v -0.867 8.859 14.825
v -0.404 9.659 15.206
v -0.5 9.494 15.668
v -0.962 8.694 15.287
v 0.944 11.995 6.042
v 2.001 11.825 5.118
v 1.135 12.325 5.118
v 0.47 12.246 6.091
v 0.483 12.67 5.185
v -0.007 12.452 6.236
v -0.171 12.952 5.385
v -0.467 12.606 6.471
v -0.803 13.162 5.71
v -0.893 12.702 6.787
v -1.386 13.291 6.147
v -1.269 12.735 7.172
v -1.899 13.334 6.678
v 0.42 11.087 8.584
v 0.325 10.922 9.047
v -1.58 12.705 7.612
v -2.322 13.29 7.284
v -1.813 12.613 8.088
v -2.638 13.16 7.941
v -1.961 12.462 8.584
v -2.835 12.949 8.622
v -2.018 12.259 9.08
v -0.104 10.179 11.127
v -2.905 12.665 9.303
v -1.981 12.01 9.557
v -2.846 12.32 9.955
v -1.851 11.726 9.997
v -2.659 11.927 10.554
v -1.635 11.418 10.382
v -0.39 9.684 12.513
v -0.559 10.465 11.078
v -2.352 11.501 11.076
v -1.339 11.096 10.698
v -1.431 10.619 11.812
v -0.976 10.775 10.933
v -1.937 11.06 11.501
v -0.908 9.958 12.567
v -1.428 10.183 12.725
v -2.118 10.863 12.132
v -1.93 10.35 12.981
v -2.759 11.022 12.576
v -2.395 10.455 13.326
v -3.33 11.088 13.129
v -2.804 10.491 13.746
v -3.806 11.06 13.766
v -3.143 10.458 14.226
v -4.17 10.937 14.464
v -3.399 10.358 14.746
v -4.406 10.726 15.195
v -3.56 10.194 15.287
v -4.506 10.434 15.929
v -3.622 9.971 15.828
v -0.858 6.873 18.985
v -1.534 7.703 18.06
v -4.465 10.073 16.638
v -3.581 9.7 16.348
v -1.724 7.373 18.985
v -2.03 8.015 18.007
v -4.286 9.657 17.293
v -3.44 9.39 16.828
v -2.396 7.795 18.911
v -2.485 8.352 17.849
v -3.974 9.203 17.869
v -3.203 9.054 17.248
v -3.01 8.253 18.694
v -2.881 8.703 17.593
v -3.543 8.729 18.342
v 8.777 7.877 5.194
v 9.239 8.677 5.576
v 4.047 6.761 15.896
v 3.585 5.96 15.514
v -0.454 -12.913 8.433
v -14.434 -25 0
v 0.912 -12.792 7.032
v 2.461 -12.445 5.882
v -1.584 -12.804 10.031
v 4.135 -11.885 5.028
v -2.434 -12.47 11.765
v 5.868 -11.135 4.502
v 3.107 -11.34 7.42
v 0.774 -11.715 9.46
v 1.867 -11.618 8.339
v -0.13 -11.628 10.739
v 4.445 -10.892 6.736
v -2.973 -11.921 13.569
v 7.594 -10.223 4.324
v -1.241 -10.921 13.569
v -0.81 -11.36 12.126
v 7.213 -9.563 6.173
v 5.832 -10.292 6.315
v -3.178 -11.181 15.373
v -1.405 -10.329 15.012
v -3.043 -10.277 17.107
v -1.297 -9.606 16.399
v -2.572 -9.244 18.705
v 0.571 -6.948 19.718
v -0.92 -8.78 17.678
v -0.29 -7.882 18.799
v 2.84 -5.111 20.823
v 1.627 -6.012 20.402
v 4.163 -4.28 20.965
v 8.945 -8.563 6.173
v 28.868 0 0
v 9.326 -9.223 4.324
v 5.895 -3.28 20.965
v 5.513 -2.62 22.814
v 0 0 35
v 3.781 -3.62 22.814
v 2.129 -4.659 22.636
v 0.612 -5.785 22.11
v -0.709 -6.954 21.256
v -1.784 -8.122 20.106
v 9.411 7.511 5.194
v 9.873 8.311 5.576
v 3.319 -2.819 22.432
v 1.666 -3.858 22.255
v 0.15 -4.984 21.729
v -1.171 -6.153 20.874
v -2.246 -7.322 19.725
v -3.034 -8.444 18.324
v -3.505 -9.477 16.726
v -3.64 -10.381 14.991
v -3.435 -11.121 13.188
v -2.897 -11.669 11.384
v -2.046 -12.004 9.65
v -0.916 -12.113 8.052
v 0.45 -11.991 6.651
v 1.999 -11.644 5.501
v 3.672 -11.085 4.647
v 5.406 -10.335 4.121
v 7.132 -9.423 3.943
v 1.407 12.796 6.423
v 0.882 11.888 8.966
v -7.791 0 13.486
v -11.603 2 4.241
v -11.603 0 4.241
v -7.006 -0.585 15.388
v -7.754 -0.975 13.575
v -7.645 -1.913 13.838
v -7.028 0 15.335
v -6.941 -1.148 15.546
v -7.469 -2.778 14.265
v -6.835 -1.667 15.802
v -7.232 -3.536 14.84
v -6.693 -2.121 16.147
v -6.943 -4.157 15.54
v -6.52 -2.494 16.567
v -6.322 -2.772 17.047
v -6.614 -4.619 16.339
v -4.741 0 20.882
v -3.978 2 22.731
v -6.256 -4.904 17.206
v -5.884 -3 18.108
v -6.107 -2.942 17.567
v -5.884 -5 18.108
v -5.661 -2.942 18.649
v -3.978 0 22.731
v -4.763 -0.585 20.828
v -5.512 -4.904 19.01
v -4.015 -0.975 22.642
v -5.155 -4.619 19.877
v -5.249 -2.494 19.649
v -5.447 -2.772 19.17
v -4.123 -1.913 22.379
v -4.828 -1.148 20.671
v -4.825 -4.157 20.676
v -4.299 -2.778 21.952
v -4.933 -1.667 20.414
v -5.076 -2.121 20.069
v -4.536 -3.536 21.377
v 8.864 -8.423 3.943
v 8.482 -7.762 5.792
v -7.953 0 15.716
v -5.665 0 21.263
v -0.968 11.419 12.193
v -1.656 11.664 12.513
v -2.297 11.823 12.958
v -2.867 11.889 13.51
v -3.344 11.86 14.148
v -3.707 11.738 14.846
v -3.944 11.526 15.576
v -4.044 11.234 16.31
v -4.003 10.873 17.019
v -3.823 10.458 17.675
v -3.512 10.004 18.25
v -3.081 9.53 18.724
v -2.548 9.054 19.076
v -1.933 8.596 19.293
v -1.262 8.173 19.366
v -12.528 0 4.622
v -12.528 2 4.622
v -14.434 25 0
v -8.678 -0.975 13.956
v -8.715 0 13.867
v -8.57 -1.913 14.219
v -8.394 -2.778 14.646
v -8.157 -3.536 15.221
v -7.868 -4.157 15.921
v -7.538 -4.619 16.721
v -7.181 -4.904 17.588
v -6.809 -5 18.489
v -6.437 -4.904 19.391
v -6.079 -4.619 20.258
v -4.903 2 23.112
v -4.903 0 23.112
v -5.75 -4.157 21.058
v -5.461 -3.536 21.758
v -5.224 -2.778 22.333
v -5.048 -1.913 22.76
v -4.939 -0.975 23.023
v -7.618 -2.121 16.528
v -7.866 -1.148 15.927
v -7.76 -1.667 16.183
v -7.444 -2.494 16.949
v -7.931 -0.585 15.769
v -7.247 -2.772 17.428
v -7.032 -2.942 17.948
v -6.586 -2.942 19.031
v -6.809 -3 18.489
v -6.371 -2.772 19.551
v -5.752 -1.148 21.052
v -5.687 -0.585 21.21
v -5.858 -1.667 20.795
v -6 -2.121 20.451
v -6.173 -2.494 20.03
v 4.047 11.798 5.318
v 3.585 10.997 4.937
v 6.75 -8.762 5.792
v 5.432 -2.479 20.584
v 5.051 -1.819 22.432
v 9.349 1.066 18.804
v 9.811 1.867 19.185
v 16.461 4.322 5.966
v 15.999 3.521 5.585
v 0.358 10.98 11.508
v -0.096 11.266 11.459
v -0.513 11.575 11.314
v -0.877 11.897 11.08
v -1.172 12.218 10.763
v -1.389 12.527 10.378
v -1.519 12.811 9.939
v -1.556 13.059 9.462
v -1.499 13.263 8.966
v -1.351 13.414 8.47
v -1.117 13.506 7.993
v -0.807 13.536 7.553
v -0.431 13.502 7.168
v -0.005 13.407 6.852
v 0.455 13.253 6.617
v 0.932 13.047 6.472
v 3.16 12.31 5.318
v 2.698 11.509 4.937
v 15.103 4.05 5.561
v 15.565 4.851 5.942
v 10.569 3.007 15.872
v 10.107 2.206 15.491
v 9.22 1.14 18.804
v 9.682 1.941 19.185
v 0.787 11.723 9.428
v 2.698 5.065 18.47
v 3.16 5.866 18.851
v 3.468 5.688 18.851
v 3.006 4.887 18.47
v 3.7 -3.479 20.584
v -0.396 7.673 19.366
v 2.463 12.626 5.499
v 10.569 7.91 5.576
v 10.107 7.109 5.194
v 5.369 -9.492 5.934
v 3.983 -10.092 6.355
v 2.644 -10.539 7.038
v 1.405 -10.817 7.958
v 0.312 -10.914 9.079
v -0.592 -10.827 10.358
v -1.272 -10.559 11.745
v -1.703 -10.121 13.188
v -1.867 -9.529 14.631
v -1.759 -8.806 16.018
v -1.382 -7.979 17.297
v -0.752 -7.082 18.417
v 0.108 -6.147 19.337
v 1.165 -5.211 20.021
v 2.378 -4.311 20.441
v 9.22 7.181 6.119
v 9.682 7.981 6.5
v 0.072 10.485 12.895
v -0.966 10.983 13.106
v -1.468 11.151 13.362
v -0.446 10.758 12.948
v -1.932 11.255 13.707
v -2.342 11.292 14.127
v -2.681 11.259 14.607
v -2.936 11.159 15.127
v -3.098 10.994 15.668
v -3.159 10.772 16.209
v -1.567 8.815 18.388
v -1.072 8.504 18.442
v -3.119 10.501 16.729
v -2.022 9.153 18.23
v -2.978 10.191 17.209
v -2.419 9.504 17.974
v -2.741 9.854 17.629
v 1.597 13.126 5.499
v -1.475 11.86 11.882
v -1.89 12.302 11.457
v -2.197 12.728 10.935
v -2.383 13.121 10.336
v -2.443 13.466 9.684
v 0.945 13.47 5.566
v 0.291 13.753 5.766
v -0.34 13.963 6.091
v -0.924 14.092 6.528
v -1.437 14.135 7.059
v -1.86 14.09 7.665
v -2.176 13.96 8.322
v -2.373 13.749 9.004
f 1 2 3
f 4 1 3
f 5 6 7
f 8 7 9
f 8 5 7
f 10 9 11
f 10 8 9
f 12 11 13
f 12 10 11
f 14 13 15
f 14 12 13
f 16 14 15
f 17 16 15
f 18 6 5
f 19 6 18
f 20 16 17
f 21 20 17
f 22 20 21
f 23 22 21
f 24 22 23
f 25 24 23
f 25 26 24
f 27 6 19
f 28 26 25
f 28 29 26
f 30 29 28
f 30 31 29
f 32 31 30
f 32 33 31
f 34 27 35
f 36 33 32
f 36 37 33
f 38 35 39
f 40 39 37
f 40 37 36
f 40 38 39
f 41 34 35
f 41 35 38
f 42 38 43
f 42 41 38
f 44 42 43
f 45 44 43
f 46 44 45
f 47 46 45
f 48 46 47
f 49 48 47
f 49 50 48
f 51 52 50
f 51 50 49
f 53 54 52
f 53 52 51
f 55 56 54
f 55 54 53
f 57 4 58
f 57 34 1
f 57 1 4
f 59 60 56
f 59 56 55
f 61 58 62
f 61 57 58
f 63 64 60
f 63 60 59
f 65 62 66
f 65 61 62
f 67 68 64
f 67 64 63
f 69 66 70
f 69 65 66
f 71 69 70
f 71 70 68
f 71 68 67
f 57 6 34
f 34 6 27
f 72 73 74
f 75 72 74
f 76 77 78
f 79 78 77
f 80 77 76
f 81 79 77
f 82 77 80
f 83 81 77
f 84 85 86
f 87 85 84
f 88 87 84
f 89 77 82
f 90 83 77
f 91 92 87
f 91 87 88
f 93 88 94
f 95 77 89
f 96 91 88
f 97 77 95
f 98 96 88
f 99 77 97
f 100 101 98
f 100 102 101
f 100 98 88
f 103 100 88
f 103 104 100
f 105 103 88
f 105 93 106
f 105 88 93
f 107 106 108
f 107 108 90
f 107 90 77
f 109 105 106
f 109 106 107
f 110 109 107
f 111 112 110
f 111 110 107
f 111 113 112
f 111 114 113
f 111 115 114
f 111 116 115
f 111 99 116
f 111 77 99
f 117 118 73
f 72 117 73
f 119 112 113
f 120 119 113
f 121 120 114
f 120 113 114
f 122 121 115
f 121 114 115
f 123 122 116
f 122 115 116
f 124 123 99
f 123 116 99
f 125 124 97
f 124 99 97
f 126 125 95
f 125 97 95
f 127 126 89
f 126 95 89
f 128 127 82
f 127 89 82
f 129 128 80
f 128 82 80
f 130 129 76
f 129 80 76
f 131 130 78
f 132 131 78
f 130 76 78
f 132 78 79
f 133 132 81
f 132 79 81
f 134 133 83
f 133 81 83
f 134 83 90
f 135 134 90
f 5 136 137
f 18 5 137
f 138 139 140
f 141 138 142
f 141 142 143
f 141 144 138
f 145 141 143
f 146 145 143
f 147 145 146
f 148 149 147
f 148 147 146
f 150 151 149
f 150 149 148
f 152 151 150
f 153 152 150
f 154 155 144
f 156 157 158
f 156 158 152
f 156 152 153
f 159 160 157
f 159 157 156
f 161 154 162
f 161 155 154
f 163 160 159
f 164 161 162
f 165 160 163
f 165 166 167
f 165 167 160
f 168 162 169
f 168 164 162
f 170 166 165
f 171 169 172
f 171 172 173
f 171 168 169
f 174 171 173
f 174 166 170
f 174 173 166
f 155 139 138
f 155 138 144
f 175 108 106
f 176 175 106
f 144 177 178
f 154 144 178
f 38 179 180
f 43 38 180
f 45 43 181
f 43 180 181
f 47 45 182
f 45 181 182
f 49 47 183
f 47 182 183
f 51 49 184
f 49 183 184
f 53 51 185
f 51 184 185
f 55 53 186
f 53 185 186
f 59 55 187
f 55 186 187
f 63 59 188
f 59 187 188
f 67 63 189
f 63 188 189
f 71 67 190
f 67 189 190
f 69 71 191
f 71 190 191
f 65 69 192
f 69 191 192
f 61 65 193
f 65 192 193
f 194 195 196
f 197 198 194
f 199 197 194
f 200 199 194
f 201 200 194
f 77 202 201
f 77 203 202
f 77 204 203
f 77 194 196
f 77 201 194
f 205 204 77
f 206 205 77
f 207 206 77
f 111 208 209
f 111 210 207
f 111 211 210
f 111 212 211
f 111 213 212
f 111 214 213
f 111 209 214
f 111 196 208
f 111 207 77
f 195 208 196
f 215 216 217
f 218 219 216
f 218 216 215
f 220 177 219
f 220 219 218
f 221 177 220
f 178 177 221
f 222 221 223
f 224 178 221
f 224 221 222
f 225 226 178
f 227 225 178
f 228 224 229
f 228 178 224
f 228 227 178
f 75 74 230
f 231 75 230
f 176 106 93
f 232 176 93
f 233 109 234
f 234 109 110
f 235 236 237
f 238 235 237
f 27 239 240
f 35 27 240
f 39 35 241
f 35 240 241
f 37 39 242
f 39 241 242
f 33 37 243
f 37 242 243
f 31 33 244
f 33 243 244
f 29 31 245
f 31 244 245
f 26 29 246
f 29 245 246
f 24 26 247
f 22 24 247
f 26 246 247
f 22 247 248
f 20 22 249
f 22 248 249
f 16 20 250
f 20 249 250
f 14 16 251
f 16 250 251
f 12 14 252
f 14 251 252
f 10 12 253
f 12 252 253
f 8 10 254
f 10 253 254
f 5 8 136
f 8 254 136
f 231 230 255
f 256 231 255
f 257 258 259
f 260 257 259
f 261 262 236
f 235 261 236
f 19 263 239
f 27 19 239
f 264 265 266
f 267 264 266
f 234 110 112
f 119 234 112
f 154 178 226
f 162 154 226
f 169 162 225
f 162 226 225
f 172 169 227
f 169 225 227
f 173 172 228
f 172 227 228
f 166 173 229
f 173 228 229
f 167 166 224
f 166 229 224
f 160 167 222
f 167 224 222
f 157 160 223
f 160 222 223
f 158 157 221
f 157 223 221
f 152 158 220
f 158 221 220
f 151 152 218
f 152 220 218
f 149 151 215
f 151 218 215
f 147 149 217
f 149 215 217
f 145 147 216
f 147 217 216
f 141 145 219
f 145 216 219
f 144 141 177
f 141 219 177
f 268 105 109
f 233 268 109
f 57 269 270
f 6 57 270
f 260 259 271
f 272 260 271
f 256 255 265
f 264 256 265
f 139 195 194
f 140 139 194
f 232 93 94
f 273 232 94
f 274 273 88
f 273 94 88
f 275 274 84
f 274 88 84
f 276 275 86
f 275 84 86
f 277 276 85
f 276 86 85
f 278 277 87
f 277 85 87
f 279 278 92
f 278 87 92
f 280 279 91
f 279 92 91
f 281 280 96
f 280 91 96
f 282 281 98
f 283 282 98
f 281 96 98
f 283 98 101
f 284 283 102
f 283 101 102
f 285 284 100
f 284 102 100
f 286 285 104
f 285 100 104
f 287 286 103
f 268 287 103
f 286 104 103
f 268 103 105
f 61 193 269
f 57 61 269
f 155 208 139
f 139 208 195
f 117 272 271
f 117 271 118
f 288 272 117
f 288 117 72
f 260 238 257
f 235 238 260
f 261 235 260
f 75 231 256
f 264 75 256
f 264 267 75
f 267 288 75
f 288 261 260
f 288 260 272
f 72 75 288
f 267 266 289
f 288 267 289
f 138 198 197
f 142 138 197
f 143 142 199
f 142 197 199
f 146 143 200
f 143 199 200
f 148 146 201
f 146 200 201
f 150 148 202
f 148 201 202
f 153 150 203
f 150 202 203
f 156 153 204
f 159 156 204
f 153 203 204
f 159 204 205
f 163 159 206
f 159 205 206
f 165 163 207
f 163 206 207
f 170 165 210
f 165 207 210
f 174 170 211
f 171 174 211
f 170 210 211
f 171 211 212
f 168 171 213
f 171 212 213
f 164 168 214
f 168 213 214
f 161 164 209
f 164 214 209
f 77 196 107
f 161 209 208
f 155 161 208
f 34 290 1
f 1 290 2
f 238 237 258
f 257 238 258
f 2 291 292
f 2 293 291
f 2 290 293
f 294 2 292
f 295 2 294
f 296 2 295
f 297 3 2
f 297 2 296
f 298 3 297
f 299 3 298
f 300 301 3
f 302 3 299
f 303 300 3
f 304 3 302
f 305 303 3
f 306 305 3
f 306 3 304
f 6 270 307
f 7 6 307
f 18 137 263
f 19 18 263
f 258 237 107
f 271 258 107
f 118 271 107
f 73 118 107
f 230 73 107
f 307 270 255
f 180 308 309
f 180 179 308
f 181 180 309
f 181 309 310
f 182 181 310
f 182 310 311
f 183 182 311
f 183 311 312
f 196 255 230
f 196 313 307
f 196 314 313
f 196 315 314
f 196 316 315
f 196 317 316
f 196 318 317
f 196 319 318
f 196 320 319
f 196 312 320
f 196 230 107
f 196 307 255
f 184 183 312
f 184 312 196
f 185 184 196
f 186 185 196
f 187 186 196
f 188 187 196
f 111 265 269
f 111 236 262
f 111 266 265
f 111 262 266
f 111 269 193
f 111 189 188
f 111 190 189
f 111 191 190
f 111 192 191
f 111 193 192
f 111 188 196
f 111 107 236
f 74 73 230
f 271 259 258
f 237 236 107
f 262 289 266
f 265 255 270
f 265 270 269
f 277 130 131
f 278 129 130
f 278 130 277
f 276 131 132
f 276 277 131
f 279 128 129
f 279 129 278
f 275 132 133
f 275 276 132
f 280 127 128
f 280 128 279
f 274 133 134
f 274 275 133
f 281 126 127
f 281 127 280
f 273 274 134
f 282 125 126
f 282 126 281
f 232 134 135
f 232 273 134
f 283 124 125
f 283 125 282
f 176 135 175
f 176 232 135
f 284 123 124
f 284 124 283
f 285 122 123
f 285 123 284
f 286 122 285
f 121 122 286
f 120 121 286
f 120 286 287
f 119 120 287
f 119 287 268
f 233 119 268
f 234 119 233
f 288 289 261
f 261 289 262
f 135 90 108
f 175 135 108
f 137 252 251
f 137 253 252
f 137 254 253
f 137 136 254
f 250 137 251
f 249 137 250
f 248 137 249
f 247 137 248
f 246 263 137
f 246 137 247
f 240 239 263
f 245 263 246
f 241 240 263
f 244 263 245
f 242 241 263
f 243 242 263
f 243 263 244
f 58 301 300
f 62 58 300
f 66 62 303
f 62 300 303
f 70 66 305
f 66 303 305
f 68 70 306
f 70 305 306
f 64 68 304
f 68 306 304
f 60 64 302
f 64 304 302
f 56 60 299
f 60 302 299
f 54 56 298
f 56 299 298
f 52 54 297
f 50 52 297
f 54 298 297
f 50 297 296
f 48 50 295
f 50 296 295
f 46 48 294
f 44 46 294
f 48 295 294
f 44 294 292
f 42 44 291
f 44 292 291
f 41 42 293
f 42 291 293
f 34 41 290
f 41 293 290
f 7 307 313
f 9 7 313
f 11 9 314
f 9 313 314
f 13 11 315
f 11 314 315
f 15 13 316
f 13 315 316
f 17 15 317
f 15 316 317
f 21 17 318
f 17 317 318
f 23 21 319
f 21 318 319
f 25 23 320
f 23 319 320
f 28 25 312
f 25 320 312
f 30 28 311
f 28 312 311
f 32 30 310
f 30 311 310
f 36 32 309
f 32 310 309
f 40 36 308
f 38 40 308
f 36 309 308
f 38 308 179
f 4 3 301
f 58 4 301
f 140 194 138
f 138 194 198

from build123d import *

# Parameters (mm, degrees)
F5_DEPTH = 1
F7_DEPTH = 1
F9_DEPTH = 1


with BuildPart() as f3:
    # F0 (on Top) → F3 section 0
    with BuildSketch(Plane.XY, mode=Mode.PRIVATE) as f3_s0:
        Polygon((-14.4337567297, 25), (-14.4337567297, -25), (28.8675134595, 0), align=None)
    loft([f3_s0.sketch, Vertex(0, 0, 35)])

    # F4 (on face) → F5 (cut)
    with BuildSketch(Plane(origin=(-12.3358269725, 0, 5.0872093023), x_dir=(0, -1, 0), z_dir=(-0.9244734516, 0, 0.3812464258))):
        Polygon((-2, -0.5028181645), (0, -0.5028181645), (0, 9.4971818355), (0, 11.4971818355), (0, 17.4971818355), (0, 19.4971818355), (-2, 19.4971818355), align=None)
        with BuildLine():
            Line((0, 11.4971818355), (0, 9.4971818355))
            ThreePointArc((0, 9.4971818355), (5, 14.4971818355), (0, 19.4971818355))
            Line((0, 19.4971818355), (0, 17.4971818355))
            ThreePointArc((0, 17.4971818355), (3, 14.4971818355), (0, 11.4971818355))
        make_face()
    extrude(amount=-F5_DEPTH, mode=Mode.SUBTRACT)

    # F6 (on face) → F7 (cut)
    with BuildSketch(Plane(origin=(6.1679134863, -10.6831395349, 5.0872093023), x_dir=(0.8867565671, 0.4173352901, -0.1987310905), z_dir=(0.4622367258, -0.8006174942, 0.3812464258))):
        with BuildLine():
            Line((-0.7380038788, 19.4712978038), (-2.691246597, 19.0413642234))
            ThreePointArc((-2.691246597, 19.0413642234), (-10.3077922864, 7.1254827301), (1.6080892069, -0.4910629592))
            Line((1.6080892069, -0.4910629592), (3.5613319251, -0.0611293789))
            Line((3.5613319251, -0.0611293789), (3.1313983448, 1.8921133394))
            Line((3.1313983448, 1.8921133394), (1.1781556265, 1.462179759))
            ThreePointArc((1.1781556265, 1.462179759), (-8.3545495681, 7.5554163105), (-2.2613130166, 17.0881215051))
            Line((-2.2613130166, 17.0881215051), (-0.3080702984, 17.5180550855))
            Line((-0.3080702984, 17.5180550855), (-0.7380038788, 19.4712978038))
        make_face()
    extrude(amount=-F7_DEPTH, mode=Mode.SUBTRACT)

    # F8 (on face) → F9 (cut)
    with BuildSketch(Plane(origin=(6.1679134863, 10.6831395349, 5.0872093023), x_dir=(-0.8867565671, 0.4173352901, 0.1987310905), z_dir=(0.4622367258, 0.8006174942, 0.3812464258))):
        Polygon((2.3919107931, -0.2709502327), (3.3919107931, -0.4910629592), (3.3919107931, 14.4979807209), (3.0442146526, 14.5745130664), (-3.9632350967, 2.4372540691), (-3.9632350967, 16.4866717508), (-4.1080892069, 16.518555984), (-11.6080892069, 3.5281749272), (-10.5972096929, 3.2790696058), (-4.9632350967, 13.037399855), (-4.9632350967, 1.6334285103), (-4.1782018869, 1.46063271), (-3.4632453686, 1.3032616814), (2.3919107931, 11.4446896398), align=None)
        with BuildLine():
            ThreePointArc((5.1544700324, -0.6785410767), (9.4095342954, 1.5116065738), (8.0476246724, 6.0993642823))
            ThreePointArc((8.0476246724, 6.0993642823), (11.5155654495, 9.8960628609), (8.3789718853, 13.9707793103))
            Line((8.3789718853, 13.9707793103), (7.4023505262, 14.1857461004))
            Line((7.4023505262, 14.1857461004), (4.1778486732, -0.4635742865))
            Line((4.1778486732, -0.4635742865), (5.1544700324, -0.6785410767))
        make_face()
        with BuildLine():
            ThreePointArc((6.5517541686, 5.6694977576), (8.6463042332, 2.392630347), (5.3694368226, 0.2980802824))
            Line((5.3694368226, 0.2980802824), (5.9605954956, 2.98378902))
            Line((5.9605954956, 2.98378902), (6.0680788907, 3.4720996996))
            Line((6.0680788907, 3.4720996996), (6.5517541686, 5.6694977576))
        make_face(mode=Mode.SUBTRACT)
        with BuildLine():
            ThreePointArc((8.0476246724, 6.0993642823), (7.3508737117, 6.0678331487), (6.6592375637, 6.1578084372))
            Line((6.6592375637, 6.1578084372), (6.7667209588, 6.6461191168))
            ThreePointArc((6.7667209588, 6.6461191168), (7.4327779419, 6.4327278198), (8.0476246724, 6.0993642823))
        make_face(mode=Mode.SUBTRACT)
        with BuildLine():
            ThreePointArc((8.1640050951, 12.9941579511), (10.4489688019, 9.4193935031), (6.8742043539, 7.1344297963))
            Line((6.8742043539, 7.1344297963), (7.4116213294, 9.5759831942))
            Line((7.4116213294, 9.5759831942), (7.5191047245, 10.0642938737))
            Line((7.5191047245, 10.0642938737), (8.1640050951, 12.9941579511))
        make_face(mode=Mode.SUBTRACT)
        with BuildLine():
            Line((6.7667209588, 6.6461191168), (6.6592375637, 6.1578084372))
            ThreePointArc((6.6592375637, 6.1578084372), (7.3508737117, 6.0678331487), (8.0476246724, 6.0993642823))
            ThreePointArc((8.0476246724, 6.0993642823), (7.4327779419, 6.4327278198), (6.7667209588, 6.6461191168))
        make_face()
    extrude(amount=-F9_DEPTH, mode=Mode.SUBTRACT)


solid = f3.part
